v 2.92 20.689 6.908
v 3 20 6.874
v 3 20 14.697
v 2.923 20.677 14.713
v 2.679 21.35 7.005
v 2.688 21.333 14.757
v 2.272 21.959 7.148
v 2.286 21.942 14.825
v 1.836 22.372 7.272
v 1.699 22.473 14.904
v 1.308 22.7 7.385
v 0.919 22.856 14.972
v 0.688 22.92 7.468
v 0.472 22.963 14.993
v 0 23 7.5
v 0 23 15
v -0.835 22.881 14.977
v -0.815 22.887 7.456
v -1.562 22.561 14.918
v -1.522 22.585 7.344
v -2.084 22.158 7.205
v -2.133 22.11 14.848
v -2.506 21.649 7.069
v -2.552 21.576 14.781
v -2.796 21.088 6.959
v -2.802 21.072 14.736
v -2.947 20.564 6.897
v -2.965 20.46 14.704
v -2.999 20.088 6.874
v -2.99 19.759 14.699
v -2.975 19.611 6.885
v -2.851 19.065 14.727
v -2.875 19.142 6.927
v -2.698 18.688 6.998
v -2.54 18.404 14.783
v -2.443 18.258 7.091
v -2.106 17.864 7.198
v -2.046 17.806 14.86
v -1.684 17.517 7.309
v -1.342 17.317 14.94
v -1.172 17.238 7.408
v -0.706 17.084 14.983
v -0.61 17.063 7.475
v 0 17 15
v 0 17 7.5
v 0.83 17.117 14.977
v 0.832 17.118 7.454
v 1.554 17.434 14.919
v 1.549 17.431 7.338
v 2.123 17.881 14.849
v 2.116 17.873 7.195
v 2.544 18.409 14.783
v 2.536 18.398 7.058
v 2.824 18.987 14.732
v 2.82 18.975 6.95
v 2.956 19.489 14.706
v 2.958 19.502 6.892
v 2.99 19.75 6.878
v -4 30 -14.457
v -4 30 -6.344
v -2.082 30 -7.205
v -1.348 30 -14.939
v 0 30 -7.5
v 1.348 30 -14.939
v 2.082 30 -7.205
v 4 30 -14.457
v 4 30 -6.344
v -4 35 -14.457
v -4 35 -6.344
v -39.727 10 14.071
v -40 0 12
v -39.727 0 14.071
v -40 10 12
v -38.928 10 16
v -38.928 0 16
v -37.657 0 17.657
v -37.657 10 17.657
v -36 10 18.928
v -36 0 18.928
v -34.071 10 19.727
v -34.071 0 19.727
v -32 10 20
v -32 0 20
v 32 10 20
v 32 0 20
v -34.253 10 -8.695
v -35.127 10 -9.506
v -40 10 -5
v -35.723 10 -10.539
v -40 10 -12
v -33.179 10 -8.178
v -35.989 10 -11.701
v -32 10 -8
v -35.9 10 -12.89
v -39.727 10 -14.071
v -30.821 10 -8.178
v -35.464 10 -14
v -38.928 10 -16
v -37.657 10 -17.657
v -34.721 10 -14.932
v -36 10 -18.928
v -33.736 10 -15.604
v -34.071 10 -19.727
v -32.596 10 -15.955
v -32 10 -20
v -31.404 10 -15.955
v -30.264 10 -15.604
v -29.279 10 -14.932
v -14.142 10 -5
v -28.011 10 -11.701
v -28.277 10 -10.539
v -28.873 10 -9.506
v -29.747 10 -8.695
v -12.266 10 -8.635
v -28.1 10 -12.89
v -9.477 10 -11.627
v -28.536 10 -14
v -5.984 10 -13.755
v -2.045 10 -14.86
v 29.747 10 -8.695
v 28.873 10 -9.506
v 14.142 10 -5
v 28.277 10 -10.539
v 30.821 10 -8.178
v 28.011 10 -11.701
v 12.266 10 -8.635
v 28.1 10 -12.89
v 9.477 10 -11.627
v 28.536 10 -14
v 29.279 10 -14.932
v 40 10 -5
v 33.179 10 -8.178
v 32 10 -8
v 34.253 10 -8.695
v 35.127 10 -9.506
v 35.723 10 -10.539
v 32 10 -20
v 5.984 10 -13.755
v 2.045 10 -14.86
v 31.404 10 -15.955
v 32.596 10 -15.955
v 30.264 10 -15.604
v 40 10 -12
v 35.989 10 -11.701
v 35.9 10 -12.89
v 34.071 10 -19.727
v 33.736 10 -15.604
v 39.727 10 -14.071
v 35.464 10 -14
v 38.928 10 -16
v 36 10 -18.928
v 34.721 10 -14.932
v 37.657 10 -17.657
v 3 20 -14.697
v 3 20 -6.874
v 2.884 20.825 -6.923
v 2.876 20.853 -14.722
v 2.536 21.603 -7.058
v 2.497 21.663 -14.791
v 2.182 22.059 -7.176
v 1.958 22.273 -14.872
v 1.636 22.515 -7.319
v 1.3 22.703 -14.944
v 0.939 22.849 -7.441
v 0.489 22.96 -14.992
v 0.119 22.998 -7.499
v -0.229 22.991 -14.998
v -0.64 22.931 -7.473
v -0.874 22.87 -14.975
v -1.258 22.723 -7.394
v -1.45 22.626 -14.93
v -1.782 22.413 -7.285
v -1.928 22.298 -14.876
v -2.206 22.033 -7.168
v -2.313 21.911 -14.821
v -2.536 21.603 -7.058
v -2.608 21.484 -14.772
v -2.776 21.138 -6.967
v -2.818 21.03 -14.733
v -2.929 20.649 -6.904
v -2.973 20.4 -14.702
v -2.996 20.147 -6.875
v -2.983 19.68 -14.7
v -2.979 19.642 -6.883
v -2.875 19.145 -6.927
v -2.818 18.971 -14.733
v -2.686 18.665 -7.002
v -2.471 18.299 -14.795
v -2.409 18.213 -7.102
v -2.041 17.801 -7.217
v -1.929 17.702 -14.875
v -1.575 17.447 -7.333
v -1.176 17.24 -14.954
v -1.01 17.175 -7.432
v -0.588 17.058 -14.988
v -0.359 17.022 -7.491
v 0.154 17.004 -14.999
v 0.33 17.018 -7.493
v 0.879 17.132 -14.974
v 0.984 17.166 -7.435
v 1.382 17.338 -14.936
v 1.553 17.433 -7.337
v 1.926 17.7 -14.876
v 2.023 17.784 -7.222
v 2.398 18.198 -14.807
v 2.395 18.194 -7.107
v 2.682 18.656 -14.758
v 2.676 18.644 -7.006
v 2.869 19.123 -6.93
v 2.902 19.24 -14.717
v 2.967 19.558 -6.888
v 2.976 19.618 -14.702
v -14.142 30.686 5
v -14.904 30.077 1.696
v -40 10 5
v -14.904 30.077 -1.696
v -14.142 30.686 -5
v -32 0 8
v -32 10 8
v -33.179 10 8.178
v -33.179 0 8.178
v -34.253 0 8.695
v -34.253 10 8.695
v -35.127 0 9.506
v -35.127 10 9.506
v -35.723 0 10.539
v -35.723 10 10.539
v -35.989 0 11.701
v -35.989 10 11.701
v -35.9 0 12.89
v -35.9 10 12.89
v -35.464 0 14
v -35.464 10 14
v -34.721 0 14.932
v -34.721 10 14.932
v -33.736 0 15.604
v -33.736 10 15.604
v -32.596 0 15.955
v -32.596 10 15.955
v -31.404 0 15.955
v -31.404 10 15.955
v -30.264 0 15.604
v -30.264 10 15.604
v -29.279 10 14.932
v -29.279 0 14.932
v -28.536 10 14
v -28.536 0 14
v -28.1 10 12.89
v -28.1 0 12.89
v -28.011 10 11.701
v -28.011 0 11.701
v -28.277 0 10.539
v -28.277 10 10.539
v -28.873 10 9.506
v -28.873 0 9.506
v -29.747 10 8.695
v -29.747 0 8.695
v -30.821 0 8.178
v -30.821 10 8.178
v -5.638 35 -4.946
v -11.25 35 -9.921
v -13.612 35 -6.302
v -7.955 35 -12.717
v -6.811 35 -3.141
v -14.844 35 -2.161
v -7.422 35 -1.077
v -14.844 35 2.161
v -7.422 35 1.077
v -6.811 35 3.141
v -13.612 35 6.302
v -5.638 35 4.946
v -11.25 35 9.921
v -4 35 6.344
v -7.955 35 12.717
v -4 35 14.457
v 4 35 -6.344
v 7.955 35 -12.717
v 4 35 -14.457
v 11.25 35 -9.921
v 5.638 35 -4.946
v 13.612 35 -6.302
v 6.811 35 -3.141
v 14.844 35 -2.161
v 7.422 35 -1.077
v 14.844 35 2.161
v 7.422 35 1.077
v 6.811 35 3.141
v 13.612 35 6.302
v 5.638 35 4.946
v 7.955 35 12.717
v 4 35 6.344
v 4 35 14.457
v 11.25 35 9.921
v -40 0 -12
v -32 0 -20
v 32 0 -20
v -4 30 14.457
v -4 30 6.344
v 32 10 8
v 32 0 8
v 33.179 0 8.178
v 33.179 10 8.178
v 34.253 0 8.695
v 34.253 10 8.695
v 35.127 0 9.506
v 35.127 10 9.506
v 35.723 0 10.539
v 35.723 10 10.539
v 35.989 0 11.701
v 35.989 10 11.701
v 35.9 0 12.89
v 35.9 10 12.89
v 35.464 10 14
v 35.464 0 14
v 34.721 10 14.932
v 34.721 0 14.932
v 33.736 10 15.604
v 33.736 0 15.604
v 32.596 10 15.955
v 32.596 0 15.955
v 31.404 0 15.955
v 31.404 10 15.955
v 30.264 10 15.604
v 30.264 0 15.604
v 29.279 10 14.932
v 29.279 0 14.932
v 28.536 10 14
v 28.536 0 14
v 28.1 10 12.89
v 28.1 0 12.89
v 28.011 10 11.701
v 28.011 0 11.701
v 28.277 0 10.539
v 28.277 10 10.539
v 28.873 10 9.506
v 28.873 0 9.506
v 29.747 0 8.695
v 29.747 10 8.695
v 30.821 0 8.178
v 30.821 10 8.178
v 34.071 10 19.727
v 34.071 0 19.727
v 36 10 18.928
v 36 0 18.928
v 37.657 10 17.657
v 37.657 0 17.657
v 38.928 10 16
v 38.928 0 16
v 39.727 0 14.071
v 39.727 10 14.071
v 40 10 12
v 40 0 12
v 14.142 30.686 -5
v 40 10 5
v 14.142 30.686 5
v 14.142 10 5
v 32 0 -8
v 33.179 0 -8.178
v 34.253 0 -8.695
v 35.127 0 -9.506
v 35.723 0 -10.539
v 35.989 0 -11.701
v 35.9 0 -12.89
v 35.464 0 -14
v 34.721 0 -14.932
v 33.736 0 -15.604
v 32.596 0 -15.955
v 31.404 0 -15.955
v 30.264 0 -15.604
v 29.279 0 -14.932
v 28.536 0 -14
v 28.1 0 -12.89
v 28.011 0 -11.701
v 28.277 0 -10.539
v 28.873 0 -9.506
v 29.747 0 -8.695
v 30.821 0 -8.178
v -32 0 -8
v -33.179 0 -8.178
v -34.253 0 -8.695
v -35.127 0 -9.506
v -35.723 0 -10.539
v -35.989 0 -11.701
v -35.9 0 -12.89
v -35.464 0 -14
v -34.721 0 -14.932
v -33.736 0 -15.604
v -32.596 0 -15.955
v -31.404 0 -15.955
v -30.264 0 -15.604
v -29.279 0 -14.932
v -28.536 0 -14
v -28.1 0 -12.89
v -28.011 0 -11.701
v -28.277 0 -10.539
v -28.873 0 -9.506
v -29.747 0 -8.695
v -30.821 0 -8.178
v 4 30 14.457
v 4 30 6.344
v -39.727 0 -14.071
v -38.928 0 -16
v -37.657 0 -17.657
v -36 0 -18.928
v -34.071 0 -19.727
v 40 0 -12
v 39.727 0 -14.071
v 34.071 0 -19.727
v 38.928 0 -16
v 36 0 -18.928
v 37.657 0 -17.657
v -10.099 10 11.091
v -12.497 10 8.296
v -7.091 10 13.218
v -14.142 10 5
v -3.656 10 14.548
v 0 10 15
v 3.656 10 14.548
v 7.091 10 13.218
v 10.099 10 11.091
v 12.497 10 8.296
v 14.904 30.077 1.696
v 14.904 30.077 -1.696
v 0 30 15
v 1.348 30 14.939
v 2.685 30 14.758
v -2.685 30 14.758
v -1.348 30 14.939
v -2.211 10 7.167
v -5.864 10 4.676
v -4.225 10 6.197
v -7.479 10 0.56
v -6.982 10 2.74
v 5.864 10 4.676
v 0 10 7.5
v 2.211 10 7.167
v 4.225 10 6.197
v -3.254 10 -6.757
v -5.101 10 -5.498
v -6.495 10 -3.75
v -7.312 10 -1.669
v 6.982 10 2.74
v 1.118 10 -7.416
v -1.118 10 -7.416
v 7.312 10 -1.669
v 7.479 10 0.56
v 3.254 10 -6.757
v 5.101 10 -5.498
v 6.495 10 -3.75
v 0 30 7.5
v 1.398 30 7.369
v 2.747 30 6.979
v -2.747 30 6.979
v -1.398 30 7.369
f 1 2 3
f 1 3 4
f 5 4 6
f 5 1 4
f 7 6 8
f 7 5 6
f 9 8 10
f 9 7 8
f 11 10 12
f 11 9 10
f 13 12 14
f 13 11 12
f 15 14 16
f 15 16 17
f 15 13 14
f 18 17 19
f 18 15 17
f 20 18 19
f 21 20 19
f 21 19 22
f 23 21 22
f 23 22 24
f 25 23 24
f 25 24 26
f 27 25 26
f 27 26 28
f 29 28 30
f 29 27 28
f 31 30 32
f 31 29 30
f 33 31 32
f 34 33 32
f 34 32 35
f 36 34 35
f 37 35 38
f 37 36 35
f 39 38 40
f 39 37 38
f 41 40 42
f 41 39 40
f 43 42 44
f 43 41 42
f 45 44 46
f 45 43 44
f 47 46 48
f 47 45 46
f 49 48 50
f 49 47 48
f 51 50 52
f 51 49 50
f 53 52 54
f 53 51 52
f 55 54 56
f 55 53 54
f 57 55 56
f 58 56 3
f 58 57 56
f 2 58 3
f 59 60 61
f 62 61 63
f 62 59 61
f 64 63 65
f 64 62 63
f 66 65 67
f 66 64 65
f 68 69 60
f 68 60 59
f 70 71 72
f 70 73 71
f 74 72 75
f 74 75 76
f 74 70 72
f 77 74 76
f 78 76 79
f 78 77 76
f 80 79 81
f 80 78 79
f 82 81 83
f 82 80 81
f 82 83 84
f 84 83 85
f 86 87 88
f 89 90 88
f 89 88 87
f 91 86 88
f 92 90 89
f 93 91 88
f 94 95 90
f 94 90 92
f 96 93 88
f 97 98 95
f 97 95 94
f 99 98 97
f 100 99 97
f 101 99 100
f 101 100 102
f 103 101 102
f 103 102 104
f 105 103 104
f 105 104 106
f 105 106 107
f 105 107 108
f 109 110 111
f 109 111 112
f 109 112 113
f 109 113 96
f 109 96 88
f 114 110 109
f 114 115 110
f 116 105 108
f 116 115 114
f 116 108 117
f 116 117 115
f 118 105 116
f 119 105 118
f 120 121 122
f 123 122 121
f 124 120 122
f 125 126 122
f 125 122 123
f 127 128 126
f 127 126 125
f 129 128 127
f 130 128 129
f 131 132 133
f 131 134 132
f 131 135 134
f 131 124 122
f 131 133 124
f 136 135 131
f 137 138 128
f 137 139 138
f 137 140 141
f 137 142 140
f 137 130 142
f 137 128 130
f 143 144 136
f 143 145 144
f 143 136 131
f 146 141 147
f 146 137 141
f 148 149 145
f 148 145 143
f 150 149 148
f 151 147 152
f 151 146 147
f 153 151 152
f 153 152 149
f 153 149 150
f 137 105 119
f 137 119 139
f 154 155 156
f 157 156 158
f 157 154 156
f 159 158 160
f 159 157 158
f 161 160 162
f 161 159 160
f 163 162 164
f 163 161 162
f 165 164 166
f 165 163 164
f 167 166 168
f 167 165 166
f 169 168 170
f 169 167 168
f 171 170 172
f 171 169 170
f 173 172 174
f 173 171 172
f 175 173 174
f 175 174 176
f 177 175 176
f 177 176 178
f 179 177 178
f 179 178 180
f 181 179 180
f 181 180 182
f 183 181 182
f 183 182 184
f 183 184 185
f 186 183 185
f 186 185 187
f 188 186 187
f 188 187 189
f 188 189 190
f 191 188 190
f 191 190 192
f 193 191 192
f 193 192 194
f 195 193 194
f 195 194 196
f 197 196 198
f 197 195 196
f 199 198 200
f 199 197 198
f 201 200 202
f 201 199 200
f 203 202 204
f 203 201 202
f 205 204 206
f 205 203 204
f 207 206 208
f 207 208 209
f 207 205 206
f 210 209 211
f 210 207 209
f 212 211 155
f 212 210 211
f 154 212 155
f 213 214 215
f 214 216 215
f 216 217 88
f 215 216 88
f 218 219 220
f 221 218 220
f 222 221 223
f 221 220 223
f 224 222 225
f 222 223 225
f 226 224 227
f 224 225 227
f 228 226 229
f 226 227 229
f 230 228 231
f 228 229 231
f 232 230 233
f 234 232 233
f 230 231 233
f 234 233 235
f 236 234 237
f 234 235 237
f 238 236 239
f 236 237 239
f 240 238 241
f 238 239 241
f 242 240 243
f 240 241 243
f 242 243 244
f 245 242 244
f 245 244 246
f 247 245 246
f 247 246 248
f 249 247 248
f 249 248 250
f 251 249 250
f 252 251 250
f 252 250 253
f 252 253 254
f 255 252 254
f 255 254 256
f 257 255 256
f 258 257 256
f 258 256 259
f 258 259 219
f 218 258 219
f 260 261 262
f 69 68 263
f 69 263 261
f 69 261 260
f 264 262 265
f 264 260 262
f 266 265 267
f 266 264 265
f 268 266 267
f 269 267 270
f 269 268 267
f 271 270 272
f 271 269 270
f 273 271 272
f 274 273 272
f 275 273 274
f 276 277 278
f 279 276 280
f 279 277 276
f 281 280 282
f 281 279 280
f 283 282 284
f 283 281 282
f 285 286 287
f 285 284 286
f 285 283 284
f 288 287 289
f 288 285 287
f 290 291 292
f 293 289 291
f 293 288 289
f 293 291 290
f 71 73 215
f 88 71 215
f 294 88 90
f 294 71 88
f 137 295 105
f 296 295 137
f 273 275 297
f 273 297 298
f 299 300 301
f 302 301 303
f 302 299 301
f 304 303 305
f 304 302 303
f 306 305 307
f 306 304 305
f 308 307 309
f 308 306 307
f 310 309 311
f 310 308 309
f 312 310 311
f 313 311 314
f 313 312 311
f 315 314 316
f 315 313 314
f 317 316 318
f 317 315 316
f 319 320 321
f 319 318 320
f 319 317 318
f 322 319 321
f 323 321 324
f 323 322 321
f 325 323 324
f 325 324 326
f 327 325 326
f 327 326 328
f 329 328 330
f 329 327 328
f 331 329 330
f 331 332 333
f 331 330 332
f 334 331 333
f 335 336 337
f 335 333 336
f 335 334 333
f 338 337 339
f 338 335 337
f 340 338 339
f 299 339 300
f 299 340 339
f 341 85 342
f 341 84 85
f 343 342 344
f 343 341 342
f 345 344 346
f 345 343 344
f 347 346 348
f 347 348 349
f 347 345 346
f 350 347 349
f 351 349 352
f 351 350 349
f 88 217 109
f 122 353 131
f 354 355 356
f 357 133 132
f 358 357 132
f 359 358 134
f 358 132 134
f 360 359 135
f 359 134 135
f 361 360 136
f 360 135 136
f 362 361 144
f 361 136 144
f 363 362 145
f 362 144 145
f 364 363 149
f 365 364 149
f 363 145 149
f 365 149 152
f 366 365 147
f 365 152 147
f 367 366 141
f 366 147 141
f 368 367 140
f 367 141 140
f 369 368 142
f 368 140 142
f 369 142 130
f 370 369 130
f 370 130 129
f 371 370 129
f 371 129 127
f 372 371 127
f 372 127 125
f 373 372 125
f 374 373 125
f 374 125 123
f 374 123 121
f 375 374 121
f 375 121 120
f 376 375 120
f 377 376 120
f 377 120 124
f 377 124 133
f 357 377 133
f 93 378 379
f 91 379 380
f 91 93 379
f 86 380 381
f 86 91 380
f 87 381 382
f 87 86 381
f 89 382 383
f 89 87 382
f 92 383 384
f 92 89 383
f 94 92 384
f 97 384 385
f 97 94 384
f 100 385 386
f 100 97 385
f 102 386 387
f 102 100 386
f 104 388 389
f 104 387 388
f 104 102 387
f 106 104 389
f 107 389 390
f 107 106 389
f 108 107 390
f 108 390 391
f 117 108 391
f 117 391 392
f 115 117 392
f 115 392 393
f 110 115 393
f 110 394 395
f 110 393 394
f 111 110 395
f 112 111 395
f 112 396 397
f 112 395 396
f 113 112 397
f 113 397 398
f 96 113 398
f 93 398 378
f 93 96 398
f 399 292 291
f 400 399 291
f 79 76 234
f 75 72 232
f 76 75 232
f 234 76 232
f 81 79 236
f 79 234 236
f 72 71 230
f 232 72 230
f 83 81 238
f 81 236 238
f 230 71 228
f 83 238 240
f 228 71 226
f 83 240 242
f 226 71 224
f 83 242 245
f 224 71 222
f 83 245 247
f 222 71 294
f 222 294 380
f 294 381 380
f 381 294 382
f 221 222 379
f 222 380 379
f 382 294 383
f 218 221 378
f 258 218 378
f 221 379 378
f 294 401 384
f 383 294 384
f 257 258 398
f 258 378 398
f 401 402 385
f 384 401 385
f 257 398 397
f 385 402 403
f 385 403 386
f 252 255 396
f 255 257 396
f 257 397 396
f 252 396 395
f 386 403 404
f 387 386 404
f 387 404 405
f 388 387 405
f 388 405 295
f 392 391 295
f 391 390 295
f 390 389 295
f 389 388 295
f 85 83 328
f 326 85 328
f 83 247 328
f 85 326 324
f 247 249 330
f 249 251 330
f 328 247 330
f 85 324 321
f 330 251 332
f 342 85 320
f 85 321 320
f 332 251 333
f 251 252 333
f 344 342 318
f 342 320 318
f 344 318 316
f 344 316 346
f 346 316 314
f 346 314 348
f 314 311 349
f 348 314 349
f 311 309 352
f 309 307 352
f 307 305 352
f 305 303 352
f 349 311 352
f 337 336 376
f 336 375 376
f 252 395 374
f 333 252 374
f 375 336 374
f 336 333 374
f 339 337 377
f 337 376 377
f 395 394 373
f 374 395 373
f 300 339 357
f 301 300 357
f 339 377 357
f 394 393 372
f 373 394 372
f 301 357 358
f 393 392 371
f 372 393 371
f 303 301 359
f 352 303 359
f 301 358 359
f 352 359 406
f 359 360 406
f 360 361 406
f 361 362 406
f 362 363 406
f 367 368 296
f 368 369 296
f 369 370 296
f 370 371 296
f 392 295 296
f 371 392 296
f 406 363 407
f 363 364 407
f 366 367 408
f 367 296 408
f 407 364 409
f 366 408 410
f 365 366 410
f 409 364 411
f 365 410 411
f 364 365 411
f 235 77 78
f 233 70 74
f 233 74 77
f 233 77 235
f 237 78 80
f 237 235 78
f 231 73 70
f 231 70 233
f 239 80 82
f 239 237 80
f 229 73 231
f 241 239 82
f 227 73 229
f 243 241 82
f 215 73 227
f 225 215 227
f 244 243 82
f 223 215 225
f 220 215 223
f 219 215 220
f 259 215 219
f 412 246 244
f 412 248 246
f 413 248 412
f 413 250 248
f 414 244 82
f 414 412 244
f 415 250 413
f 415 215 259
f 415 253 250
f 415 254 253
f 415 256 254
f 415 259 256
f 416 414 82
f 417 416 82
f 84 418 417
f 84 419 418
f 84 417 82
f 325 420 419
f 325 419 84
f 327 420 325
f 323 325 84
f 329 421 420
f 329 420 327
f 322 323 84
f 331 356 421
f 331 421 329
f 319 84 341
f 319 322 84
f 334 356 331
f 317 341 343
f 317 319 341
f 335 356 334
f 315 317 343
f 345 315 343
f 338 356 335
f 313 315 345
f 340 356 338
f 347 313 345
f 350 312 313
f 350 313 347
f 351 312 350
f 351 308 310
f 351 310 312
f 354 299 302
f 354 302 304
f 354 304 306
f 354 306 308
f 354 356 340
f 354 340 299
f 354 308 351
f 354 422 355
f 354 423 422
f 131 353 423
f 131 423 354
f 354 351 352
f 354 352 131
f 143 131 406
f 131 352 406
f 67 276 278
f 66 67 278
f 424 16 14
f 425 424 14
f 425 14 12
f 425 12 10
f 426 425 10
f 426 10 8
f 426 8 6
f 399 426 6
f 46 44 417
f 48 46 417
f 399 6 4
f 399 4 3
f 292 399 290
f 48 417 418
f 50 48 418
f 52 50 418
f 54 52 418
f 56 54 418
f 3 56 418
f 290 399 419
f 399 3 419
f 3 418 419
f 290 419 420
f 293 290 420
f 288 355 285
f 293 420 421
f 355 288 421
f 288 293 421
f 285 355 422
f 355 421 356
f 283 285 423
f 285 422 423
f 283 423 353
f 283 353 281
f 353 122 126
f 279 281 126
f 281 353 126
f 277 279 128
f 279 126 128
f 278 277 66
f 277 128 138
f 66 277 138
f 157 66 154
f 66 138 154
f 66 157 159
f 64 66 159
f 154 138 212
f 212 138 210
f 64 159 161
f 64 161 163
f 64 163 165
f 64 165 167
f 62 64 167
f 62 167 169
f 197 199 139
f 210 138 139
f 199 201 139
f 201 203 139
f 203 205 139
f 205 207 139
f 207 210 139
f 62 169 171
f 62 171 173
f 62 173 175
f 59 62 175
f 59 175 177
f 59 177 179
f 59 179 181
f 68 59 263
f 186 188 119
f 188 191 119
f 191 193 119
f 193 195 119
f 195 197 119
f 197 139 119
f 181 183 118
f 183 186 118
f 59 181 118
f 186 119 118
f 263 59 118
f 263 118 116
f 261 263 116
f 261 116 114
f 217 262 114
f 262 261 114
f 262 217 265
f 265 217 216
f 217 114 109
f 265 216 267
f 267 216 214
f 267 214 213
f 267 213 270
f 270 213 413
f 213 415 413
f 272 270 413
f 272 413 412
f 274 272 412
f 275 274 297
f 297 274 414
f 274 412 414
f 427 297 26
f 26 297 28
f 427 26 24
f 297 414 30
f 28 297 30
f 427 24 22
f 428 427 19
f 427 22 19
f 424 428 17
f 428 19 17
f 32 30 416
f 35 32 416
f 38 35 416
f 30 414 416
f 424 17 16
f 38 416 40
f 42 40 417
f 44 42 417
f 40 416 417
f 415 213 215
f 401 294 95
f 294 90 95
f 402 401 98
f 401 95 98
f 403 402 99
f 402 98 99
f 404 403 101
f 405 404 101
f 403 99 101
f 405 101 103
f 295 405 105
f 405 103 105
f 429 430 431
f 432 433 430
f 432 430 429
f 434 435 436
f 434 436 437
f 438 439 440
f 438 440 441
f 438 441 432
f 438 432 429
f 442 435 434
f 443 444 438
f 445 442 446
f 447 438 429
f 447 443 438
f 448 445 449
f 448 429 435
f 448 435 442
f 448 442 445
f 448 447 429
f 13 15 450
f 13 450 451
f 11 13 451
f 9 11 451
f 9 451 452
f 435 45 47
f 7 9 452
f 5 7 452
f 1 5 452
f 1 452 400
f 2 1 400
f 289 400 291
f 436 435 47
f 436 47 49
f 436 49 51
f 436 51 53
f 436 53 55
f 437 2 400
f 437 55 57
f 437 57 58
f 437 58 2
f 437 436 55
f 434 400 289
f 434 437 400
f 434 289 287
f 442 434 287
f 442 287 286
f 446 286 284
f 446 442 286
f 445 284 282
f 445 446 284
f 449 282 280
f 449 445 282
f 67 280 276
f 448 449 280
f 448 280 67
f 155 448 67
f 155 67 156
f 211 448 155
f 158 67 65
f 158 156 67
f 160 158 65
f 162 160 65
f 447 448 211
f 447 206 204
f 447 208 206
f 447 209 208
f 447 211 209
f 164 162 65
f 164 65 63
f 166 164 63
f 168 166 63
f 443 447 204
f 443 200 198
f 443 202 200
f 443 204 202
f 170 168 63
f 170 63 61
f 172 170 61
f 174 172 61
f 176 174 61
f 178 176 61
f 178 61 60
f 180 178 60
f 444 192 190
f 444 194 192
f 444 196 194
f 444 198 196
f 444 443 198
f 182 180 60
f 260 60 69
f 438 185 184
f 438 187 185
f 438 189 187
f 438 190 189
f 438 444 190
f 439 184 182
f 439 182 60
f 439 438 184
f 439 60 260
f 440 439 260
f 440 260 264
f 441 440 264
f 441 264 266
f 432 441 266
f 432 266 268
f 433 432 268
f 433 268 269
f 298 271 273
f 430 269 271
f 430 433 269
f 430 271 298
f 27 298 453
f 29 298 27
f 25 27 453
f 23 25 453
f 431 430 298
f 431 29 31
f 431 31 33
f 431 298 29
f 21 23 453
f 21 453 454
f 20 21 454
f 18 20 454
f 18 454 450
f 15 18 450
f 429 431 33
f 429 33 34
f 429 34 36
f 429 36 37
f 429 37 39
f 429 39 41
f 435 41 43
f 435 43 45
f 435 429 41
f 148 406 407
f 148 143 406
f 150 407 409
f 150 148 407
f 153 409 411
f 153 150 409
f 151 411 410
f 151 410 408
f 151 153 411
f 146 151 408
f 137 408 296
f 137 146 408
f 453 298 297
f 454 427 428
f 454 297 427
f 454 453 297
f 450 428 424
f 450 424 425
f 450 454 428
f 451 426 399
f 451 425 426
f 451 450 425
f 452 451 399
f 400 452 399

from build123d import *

# Parameters (mm, degrees)
SKETCH_1_W               = 80
SKETCH_1_H               = 40
EXTRUDE_1_DEPTH          = 10
FILLET_1_R               = 8
SKETCH_2_R               = 15
SKETCH_2_R_2             = 7.5
EXTRUDE_2_DEPTH          = 25
RIB_1_REACH              = 58.789
SKETCH_3_WALL_W          = 147.593788104
SKETCH_3_WALL_H          = 10
SKETCH_4_R               = 4
CUT_EXTRUDE_1_DEPTH      = 52.23475383
MIRROR_4_COPY_1_SKETCH_R = 4
MIRROR_4_COPY_1_DEPTH    = 52.23475383
MIRROR_4_COPY_2_SKETCH_R = 4
MIRROR_4_COPY_2_DEPTH    = 52.23475383
SKETCH_5_W               = 8
SKETCH_5_H               = 31.29917875
CUT_EXTRUDE_2_DEPTH      = 5
CUT_EXTRUDE_4_DEPTH      = 57.789083458
CUT_EXTRUDE_4_DEPTH_BACK = 57.789083458
SKETCH_6_R               = 3


with BuildPart() as part:
    # 草图1 → 凸台-拉伸1 (new body)
    with BuildSketch(Plane(origin=(0, 0, 0), x_dir=(1, 0, 0), z_dir=(0, 1, 0))):
        Rectangle(SKETCH_1_W, SKETCH_1_H)
    extrude(amount=EXTRUDE_1_DEPTH)

    # 圆角1
    fillet_1_edges = [part.edges().sort_by_distance(p)[0] for p in [
        (-40, 5, -20),
        (40, 5, -20),
        (40, 5, 20),
        (-40, 5, 20),
    ]]
    fillet(fillet_1_edges, radius=FILLET_1_R)

    # 草图2 → 凸台-拉伸2 (add)
    with BuildSketch(Plane(origin=(0, 10, 0), x_dir=(1, 0, 0), z_dir=(0, 1, 0))):
        with Locations(Location((0, 0, 0), (0, 0, 270))):
            Circle(SKETCH_2_R)
        with Locations(Location((0, 0, 0), (0, 0, 270))):
            Circle(SKETCH_2_R_2, mode=Mode.SUBTRACT)
    extrude(amount=EXTRUDE_2_DEPTH)

    # 草图3 wall → 筋1 (add, up to next)
    with BuildSketch(Plane(origin=(27.5, 20, 0), x_dir=(0.780868809443, -0.624695047554, 0), z_dir=(0.624695047554, 0.780868809443, 0)), mode=Mode.PRIVATE) as rib_1_sk1:
        Rectangle(SKETCH_3_WALL_W, SKETCH_3_WALL_H)
    rib_1_tool1 = extrude(rib_1_sk1.sketch, amount=-RIB_1_REACH, mode=Mode.PRIVATE) - part.part
    rib_1 = rib_1_tool1.solids().sort_by_distance((27.5, 20, 0))[0]
    add(rib_1)

    # 镜向1: 筋1 across plane
    add(rib_1.mirror(Plane(origin=(0, 0, 0), x_dir=(0, 0, 1), z_dir=(1, 0, 0))))

    # 草图4 → 切除-拉伸1 (cut, through all)
    with BuildSketch(Plane(origin=(0, 10, 0), x_dir=(1, 0, 0), z_dir=(0, 1, 0))):
        with Locations(Location((32, 12, 0), (0, 0, 270))):
            Circle(SKETCH_4_R)
    cut_extrude_1 = extrude(amount=-CUT_EXTRUDE_1_DEPTH, mode=Mode.SUBTRACT)

    # 镜向2: 切除-拉伸1 across plane
    add(cut_extrude_1.mirror(Plane.XY), mode=Mode.SUBTRACT)

    # 镜向3: 切除-拉伸1 across plane
    add(cut_extrude_1.mirror(Plane(origin=(0, 0, 0), x_dir=(0, 0, 1), z_dir=(1, 0, 0))), mode=Mode.SUBTRACT)

    # 镜向4 copy 1 sketch → 镜向4 copy 1 (cut, through all)
    with BuildSketch(Plane(origin=(0, 10, 0), x_dir=(-1, 0, 0), z_dir=(0, 1, 0))):
        with Locations(Location((32, 12, 0), (0, 0, 270))):
            Circle(MIRROR_4_COPY_1_SKETCH_R)
    extrude(amount=-MIRROR_4_COPY_1_DEPTH, mode=Mode.SUBTRACT)

    # 镜向4 copy 2 sketch → 镜向4 copy 2 (cut, through all)
    with BuildSketch(Plane(origin=(0, 10, 0), x_dir=(1, 0, 0), z_dir=(0, 1, 0))):
        with Locations((32, -12)):
            Circle(MIRROR_4_COPY_2_SKETCH_R)
    extrude(amount=-MIRROR_4_COPY_2_DEPTH, mode=Mode.SUBTRACT)

    # 草图5 → 切除-拉伸2 (cut)
    with BuildSketch(Plane(origin=(0, 35, 0), x_dir=(1, 0, 0), z_dir=(0, 1, 0))):
        Rectangle(SKETCH_5_W, SKETCH_5_H)
    extrude(amount=-CUT_EXTRUDE_2_DEPTH, mode=Mode.SUBTRACT)

    # 草图6 → 切除-拉伸4 (cut, two sides: drawn at the far end of the back side and taken through both)
    with BuildSketch(Plane.XY.offset(-CUT_EXTRUDE_4_DEPTH_BACK)):
        with Locations((0, 20)):
            Circle(SKETCH_6_R)
    extrude(amount=CUT_EXTRUDE_4_DEPTH + CUT_EXTRUDE_4_DEPTH_BACK, mode=Mode.SUBTRACT)


solid = part.part
